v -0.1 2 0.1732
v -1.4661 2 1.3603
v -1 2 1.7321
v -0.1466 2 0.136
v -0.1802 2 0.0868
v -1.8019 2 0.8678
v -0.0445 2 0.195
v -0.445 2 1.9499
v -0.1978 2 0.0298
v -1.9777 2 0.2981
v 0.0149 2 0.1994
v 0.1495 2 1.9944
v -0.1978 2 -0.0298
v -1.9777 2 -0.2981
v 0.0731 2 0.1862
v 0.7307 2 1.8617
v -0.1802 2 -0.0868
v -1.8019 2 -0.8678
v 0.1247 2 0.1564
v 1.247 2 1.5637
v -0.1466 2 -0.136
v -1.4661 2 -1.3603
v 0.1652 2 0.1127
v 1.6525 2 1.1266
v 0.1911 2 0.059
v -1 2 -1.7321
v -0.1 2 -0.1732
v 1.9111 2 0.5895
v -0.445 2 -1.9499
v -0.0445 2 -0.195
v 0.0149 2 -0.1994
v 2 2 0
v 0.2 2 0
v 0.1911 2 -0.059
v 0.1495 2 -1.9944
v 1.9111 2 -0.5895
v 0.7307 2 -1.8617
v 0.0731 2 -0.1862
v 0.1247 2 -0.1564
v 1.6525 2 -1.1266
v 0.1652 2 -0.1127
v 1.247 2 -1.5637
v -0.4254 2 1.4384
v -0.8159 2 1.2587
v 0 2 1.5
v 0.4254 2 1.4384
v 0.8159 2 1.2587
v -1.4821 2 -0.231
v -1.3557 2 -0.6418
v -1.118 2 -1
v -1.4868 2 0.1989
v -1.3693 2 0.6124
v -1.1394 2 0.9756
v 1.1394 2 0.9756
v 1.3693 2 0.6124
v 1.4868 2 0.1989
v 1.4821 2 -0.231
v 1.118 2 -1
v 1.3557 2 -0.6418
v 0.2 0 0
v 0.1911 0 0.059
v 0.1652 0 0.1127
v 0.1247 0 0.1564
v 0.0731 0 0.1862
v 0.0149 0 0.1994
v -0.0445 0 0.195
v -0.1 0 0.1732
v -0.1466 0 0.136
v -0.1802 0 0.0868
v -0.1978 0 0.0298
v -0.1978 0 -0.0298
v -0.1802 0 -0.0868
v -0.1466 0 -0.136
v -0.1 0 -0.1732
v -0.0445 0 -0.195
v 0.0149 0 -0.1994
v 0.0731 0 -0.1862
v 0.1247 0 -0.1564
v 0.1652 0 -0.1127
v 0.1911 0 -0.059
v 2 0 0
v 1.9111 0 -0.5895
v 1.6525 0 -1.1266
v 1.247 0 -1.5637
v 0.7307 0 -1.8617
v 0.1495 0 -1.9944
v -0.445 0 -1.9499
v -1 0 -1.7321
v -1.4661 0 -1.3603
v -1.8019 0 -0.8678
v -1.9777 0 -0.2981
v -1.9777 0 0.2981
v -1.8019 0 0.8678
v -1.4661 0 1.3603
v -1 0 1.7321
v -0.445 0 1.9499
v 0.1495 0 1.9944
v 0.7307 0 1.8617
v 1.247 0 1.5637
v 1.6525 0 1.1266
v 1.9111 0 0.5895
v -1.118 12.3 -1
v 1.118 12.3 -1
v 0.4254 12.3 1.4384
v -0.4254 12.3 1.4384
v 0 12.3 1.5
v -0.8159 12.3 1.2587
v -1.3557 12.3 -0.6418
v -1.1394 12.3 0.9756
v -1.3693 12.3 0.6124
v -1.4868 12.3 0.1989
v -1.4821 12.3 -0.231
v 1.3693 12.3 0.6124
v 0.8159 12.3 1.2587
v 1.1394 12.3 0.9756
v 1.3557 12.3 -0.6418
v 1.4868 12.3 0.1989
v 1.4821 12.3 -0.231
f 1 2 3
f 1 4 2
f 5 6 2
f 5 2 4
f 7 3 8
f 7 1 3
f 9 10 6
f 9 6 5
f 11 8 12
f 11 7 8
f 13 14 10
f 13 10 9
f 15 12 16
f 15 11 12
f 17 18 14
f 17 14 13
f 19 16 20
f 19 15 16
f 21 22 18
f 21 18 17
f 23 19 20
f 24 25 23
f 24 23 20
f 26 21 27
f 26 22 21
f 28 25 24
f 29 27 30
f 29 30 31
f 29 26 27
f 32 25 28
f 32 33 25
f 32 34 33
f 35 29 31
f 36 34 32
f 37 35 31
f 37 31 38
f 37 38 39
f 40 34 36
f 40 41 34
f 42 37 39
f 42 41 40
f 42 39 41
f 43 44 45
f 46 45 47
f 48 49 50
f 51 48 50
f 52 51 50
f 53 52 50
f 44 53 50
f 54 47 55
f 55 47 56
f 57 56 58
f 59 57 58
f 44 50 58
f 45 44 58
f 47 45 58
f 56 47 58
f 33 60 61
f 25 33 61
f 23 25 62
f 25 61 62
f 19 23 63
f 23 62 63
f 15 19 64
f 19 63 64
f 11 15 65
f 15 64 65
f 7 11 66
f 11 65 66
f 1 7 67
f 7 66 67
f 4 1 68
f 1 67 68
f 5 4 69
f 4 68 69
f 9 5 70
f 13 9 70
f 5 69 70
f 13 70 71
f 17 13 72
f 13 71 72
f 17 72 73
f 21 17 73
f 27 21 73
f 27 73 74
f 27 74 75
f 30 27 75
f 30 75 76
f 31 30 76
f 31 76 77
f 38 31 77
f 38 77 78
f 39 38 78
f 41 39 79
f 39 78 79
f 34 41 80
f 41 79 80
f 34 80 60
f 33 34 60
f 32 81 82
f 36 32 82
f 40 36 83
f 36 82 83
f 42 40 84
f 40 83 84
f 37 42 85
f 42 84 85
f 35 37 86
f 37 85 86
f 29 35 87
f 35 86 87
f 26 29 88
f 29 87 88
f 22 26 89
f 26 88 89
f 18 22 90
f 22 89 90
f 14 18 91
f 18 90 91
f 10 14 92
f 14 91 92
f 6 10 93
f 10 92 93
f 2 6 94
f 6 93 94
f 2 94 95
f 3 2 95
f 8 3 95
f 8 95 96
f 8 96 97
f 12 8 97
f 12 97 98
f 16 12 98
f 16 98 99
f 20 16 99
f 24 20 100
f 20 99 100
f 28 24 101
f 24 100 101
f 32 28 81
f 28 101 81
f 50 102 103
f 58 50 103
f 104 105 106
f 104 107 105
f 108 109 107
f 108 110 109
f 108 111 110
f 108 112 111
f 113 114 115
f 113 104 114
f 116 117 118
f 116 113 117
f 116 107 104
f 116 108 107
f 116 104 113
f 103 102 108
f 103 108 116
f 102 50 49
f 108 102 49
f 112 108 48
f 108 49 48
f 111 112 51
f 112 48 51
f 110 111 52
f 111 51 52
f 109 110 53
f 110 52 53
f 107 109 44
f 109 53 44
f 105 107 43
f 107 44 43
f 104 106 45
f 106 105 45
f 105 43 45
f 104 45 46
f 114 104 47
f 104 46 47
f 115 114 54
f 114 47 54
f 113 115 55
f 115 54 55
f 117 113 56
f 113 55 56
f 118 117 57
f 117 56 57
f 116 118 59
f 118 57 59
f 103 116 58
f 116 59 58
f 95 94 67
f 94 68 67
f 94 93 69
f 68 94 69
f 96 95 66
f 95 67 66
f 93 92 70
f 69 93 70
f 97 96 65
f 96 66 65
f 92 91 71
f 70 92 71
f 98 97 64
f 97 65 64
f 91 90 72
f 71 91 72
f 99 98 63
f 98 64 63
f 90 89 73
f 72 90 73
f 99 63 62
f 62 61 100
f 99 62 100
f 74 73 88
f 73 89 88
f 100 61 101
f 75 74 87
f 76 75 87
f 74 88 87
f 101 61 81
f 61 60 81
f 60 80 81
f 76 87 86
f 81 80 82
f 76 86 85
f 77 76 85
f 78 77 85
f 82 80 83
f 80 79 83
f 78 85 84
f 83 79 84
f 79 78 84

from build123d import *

# Parameters (mm, degrees)
CROQUIS1_R              = 2
SALIENTE_EXTRUIR1_DEPTH = 2
CROQUIS2_R              = 0.2
CORTAR_EXTRUIR1_DEPTH   = 2
CROQUIS3_R              = 1.5
SALIENTE_EXTRUIR2_DEPTH = 10.3
CORTAR_EXTRUIR2_DEPTH   = 10.3


with BuildPart() as part:
    # Croquis1 → Saliente-Extruir1 (new body)
    with BuildSketch(Plane(origin=(0, 0, 0), x_dir=(1, 0, 0), z_dir=(0, 1, 0))):
        Circle(CROQUIS1_R)
    extrude(amount=SALIENTE_EXTRUIR1_DEPTH)

    # Croquis2 → Cortar-Extruir1 (cut)
    with BuildSketch(Plane.XZ):
        Circle(CROQUIS2_R)
    extrude(amount=-CORTAR_EXTRUIR1_DEPTH, mode=Mode.SUBTRACT)


with BuildPart() as body_2:
    # Croquis3 → Saliente-Extruir2 (new body)
    with BuildSketch(Plane(origin=(0, 2, 0), x_dir=(1, 0, 0), z_dir=(0, 1, 0))):
        Circle(CROQUIS3_R)
    extrude(amount=SALIENTE_EXTRUIR2_DEPTH)

    # Croquis5 → Cortar-Extruir2 (cut)
    with BuildSketch(Plane(origin=(0, 12.3, 0), x_dir=(1, 0, 0), z_dir=(0, 1, 0))):
        with BuildLine():
            Line((0, 1), (1.118033989, 1))
            ThreePointArc((1.118033989, 1), (0, 1.5), (-1.118033989, 1))
            Line((-1.118033989, 1), (0, 1))
        make_face()
    extrude(amount=-CORTAR_EXTRUIR2_DEPTH, mode=Mode.SUBTRACT)


solid = Compound([part.part, body_2.part])
